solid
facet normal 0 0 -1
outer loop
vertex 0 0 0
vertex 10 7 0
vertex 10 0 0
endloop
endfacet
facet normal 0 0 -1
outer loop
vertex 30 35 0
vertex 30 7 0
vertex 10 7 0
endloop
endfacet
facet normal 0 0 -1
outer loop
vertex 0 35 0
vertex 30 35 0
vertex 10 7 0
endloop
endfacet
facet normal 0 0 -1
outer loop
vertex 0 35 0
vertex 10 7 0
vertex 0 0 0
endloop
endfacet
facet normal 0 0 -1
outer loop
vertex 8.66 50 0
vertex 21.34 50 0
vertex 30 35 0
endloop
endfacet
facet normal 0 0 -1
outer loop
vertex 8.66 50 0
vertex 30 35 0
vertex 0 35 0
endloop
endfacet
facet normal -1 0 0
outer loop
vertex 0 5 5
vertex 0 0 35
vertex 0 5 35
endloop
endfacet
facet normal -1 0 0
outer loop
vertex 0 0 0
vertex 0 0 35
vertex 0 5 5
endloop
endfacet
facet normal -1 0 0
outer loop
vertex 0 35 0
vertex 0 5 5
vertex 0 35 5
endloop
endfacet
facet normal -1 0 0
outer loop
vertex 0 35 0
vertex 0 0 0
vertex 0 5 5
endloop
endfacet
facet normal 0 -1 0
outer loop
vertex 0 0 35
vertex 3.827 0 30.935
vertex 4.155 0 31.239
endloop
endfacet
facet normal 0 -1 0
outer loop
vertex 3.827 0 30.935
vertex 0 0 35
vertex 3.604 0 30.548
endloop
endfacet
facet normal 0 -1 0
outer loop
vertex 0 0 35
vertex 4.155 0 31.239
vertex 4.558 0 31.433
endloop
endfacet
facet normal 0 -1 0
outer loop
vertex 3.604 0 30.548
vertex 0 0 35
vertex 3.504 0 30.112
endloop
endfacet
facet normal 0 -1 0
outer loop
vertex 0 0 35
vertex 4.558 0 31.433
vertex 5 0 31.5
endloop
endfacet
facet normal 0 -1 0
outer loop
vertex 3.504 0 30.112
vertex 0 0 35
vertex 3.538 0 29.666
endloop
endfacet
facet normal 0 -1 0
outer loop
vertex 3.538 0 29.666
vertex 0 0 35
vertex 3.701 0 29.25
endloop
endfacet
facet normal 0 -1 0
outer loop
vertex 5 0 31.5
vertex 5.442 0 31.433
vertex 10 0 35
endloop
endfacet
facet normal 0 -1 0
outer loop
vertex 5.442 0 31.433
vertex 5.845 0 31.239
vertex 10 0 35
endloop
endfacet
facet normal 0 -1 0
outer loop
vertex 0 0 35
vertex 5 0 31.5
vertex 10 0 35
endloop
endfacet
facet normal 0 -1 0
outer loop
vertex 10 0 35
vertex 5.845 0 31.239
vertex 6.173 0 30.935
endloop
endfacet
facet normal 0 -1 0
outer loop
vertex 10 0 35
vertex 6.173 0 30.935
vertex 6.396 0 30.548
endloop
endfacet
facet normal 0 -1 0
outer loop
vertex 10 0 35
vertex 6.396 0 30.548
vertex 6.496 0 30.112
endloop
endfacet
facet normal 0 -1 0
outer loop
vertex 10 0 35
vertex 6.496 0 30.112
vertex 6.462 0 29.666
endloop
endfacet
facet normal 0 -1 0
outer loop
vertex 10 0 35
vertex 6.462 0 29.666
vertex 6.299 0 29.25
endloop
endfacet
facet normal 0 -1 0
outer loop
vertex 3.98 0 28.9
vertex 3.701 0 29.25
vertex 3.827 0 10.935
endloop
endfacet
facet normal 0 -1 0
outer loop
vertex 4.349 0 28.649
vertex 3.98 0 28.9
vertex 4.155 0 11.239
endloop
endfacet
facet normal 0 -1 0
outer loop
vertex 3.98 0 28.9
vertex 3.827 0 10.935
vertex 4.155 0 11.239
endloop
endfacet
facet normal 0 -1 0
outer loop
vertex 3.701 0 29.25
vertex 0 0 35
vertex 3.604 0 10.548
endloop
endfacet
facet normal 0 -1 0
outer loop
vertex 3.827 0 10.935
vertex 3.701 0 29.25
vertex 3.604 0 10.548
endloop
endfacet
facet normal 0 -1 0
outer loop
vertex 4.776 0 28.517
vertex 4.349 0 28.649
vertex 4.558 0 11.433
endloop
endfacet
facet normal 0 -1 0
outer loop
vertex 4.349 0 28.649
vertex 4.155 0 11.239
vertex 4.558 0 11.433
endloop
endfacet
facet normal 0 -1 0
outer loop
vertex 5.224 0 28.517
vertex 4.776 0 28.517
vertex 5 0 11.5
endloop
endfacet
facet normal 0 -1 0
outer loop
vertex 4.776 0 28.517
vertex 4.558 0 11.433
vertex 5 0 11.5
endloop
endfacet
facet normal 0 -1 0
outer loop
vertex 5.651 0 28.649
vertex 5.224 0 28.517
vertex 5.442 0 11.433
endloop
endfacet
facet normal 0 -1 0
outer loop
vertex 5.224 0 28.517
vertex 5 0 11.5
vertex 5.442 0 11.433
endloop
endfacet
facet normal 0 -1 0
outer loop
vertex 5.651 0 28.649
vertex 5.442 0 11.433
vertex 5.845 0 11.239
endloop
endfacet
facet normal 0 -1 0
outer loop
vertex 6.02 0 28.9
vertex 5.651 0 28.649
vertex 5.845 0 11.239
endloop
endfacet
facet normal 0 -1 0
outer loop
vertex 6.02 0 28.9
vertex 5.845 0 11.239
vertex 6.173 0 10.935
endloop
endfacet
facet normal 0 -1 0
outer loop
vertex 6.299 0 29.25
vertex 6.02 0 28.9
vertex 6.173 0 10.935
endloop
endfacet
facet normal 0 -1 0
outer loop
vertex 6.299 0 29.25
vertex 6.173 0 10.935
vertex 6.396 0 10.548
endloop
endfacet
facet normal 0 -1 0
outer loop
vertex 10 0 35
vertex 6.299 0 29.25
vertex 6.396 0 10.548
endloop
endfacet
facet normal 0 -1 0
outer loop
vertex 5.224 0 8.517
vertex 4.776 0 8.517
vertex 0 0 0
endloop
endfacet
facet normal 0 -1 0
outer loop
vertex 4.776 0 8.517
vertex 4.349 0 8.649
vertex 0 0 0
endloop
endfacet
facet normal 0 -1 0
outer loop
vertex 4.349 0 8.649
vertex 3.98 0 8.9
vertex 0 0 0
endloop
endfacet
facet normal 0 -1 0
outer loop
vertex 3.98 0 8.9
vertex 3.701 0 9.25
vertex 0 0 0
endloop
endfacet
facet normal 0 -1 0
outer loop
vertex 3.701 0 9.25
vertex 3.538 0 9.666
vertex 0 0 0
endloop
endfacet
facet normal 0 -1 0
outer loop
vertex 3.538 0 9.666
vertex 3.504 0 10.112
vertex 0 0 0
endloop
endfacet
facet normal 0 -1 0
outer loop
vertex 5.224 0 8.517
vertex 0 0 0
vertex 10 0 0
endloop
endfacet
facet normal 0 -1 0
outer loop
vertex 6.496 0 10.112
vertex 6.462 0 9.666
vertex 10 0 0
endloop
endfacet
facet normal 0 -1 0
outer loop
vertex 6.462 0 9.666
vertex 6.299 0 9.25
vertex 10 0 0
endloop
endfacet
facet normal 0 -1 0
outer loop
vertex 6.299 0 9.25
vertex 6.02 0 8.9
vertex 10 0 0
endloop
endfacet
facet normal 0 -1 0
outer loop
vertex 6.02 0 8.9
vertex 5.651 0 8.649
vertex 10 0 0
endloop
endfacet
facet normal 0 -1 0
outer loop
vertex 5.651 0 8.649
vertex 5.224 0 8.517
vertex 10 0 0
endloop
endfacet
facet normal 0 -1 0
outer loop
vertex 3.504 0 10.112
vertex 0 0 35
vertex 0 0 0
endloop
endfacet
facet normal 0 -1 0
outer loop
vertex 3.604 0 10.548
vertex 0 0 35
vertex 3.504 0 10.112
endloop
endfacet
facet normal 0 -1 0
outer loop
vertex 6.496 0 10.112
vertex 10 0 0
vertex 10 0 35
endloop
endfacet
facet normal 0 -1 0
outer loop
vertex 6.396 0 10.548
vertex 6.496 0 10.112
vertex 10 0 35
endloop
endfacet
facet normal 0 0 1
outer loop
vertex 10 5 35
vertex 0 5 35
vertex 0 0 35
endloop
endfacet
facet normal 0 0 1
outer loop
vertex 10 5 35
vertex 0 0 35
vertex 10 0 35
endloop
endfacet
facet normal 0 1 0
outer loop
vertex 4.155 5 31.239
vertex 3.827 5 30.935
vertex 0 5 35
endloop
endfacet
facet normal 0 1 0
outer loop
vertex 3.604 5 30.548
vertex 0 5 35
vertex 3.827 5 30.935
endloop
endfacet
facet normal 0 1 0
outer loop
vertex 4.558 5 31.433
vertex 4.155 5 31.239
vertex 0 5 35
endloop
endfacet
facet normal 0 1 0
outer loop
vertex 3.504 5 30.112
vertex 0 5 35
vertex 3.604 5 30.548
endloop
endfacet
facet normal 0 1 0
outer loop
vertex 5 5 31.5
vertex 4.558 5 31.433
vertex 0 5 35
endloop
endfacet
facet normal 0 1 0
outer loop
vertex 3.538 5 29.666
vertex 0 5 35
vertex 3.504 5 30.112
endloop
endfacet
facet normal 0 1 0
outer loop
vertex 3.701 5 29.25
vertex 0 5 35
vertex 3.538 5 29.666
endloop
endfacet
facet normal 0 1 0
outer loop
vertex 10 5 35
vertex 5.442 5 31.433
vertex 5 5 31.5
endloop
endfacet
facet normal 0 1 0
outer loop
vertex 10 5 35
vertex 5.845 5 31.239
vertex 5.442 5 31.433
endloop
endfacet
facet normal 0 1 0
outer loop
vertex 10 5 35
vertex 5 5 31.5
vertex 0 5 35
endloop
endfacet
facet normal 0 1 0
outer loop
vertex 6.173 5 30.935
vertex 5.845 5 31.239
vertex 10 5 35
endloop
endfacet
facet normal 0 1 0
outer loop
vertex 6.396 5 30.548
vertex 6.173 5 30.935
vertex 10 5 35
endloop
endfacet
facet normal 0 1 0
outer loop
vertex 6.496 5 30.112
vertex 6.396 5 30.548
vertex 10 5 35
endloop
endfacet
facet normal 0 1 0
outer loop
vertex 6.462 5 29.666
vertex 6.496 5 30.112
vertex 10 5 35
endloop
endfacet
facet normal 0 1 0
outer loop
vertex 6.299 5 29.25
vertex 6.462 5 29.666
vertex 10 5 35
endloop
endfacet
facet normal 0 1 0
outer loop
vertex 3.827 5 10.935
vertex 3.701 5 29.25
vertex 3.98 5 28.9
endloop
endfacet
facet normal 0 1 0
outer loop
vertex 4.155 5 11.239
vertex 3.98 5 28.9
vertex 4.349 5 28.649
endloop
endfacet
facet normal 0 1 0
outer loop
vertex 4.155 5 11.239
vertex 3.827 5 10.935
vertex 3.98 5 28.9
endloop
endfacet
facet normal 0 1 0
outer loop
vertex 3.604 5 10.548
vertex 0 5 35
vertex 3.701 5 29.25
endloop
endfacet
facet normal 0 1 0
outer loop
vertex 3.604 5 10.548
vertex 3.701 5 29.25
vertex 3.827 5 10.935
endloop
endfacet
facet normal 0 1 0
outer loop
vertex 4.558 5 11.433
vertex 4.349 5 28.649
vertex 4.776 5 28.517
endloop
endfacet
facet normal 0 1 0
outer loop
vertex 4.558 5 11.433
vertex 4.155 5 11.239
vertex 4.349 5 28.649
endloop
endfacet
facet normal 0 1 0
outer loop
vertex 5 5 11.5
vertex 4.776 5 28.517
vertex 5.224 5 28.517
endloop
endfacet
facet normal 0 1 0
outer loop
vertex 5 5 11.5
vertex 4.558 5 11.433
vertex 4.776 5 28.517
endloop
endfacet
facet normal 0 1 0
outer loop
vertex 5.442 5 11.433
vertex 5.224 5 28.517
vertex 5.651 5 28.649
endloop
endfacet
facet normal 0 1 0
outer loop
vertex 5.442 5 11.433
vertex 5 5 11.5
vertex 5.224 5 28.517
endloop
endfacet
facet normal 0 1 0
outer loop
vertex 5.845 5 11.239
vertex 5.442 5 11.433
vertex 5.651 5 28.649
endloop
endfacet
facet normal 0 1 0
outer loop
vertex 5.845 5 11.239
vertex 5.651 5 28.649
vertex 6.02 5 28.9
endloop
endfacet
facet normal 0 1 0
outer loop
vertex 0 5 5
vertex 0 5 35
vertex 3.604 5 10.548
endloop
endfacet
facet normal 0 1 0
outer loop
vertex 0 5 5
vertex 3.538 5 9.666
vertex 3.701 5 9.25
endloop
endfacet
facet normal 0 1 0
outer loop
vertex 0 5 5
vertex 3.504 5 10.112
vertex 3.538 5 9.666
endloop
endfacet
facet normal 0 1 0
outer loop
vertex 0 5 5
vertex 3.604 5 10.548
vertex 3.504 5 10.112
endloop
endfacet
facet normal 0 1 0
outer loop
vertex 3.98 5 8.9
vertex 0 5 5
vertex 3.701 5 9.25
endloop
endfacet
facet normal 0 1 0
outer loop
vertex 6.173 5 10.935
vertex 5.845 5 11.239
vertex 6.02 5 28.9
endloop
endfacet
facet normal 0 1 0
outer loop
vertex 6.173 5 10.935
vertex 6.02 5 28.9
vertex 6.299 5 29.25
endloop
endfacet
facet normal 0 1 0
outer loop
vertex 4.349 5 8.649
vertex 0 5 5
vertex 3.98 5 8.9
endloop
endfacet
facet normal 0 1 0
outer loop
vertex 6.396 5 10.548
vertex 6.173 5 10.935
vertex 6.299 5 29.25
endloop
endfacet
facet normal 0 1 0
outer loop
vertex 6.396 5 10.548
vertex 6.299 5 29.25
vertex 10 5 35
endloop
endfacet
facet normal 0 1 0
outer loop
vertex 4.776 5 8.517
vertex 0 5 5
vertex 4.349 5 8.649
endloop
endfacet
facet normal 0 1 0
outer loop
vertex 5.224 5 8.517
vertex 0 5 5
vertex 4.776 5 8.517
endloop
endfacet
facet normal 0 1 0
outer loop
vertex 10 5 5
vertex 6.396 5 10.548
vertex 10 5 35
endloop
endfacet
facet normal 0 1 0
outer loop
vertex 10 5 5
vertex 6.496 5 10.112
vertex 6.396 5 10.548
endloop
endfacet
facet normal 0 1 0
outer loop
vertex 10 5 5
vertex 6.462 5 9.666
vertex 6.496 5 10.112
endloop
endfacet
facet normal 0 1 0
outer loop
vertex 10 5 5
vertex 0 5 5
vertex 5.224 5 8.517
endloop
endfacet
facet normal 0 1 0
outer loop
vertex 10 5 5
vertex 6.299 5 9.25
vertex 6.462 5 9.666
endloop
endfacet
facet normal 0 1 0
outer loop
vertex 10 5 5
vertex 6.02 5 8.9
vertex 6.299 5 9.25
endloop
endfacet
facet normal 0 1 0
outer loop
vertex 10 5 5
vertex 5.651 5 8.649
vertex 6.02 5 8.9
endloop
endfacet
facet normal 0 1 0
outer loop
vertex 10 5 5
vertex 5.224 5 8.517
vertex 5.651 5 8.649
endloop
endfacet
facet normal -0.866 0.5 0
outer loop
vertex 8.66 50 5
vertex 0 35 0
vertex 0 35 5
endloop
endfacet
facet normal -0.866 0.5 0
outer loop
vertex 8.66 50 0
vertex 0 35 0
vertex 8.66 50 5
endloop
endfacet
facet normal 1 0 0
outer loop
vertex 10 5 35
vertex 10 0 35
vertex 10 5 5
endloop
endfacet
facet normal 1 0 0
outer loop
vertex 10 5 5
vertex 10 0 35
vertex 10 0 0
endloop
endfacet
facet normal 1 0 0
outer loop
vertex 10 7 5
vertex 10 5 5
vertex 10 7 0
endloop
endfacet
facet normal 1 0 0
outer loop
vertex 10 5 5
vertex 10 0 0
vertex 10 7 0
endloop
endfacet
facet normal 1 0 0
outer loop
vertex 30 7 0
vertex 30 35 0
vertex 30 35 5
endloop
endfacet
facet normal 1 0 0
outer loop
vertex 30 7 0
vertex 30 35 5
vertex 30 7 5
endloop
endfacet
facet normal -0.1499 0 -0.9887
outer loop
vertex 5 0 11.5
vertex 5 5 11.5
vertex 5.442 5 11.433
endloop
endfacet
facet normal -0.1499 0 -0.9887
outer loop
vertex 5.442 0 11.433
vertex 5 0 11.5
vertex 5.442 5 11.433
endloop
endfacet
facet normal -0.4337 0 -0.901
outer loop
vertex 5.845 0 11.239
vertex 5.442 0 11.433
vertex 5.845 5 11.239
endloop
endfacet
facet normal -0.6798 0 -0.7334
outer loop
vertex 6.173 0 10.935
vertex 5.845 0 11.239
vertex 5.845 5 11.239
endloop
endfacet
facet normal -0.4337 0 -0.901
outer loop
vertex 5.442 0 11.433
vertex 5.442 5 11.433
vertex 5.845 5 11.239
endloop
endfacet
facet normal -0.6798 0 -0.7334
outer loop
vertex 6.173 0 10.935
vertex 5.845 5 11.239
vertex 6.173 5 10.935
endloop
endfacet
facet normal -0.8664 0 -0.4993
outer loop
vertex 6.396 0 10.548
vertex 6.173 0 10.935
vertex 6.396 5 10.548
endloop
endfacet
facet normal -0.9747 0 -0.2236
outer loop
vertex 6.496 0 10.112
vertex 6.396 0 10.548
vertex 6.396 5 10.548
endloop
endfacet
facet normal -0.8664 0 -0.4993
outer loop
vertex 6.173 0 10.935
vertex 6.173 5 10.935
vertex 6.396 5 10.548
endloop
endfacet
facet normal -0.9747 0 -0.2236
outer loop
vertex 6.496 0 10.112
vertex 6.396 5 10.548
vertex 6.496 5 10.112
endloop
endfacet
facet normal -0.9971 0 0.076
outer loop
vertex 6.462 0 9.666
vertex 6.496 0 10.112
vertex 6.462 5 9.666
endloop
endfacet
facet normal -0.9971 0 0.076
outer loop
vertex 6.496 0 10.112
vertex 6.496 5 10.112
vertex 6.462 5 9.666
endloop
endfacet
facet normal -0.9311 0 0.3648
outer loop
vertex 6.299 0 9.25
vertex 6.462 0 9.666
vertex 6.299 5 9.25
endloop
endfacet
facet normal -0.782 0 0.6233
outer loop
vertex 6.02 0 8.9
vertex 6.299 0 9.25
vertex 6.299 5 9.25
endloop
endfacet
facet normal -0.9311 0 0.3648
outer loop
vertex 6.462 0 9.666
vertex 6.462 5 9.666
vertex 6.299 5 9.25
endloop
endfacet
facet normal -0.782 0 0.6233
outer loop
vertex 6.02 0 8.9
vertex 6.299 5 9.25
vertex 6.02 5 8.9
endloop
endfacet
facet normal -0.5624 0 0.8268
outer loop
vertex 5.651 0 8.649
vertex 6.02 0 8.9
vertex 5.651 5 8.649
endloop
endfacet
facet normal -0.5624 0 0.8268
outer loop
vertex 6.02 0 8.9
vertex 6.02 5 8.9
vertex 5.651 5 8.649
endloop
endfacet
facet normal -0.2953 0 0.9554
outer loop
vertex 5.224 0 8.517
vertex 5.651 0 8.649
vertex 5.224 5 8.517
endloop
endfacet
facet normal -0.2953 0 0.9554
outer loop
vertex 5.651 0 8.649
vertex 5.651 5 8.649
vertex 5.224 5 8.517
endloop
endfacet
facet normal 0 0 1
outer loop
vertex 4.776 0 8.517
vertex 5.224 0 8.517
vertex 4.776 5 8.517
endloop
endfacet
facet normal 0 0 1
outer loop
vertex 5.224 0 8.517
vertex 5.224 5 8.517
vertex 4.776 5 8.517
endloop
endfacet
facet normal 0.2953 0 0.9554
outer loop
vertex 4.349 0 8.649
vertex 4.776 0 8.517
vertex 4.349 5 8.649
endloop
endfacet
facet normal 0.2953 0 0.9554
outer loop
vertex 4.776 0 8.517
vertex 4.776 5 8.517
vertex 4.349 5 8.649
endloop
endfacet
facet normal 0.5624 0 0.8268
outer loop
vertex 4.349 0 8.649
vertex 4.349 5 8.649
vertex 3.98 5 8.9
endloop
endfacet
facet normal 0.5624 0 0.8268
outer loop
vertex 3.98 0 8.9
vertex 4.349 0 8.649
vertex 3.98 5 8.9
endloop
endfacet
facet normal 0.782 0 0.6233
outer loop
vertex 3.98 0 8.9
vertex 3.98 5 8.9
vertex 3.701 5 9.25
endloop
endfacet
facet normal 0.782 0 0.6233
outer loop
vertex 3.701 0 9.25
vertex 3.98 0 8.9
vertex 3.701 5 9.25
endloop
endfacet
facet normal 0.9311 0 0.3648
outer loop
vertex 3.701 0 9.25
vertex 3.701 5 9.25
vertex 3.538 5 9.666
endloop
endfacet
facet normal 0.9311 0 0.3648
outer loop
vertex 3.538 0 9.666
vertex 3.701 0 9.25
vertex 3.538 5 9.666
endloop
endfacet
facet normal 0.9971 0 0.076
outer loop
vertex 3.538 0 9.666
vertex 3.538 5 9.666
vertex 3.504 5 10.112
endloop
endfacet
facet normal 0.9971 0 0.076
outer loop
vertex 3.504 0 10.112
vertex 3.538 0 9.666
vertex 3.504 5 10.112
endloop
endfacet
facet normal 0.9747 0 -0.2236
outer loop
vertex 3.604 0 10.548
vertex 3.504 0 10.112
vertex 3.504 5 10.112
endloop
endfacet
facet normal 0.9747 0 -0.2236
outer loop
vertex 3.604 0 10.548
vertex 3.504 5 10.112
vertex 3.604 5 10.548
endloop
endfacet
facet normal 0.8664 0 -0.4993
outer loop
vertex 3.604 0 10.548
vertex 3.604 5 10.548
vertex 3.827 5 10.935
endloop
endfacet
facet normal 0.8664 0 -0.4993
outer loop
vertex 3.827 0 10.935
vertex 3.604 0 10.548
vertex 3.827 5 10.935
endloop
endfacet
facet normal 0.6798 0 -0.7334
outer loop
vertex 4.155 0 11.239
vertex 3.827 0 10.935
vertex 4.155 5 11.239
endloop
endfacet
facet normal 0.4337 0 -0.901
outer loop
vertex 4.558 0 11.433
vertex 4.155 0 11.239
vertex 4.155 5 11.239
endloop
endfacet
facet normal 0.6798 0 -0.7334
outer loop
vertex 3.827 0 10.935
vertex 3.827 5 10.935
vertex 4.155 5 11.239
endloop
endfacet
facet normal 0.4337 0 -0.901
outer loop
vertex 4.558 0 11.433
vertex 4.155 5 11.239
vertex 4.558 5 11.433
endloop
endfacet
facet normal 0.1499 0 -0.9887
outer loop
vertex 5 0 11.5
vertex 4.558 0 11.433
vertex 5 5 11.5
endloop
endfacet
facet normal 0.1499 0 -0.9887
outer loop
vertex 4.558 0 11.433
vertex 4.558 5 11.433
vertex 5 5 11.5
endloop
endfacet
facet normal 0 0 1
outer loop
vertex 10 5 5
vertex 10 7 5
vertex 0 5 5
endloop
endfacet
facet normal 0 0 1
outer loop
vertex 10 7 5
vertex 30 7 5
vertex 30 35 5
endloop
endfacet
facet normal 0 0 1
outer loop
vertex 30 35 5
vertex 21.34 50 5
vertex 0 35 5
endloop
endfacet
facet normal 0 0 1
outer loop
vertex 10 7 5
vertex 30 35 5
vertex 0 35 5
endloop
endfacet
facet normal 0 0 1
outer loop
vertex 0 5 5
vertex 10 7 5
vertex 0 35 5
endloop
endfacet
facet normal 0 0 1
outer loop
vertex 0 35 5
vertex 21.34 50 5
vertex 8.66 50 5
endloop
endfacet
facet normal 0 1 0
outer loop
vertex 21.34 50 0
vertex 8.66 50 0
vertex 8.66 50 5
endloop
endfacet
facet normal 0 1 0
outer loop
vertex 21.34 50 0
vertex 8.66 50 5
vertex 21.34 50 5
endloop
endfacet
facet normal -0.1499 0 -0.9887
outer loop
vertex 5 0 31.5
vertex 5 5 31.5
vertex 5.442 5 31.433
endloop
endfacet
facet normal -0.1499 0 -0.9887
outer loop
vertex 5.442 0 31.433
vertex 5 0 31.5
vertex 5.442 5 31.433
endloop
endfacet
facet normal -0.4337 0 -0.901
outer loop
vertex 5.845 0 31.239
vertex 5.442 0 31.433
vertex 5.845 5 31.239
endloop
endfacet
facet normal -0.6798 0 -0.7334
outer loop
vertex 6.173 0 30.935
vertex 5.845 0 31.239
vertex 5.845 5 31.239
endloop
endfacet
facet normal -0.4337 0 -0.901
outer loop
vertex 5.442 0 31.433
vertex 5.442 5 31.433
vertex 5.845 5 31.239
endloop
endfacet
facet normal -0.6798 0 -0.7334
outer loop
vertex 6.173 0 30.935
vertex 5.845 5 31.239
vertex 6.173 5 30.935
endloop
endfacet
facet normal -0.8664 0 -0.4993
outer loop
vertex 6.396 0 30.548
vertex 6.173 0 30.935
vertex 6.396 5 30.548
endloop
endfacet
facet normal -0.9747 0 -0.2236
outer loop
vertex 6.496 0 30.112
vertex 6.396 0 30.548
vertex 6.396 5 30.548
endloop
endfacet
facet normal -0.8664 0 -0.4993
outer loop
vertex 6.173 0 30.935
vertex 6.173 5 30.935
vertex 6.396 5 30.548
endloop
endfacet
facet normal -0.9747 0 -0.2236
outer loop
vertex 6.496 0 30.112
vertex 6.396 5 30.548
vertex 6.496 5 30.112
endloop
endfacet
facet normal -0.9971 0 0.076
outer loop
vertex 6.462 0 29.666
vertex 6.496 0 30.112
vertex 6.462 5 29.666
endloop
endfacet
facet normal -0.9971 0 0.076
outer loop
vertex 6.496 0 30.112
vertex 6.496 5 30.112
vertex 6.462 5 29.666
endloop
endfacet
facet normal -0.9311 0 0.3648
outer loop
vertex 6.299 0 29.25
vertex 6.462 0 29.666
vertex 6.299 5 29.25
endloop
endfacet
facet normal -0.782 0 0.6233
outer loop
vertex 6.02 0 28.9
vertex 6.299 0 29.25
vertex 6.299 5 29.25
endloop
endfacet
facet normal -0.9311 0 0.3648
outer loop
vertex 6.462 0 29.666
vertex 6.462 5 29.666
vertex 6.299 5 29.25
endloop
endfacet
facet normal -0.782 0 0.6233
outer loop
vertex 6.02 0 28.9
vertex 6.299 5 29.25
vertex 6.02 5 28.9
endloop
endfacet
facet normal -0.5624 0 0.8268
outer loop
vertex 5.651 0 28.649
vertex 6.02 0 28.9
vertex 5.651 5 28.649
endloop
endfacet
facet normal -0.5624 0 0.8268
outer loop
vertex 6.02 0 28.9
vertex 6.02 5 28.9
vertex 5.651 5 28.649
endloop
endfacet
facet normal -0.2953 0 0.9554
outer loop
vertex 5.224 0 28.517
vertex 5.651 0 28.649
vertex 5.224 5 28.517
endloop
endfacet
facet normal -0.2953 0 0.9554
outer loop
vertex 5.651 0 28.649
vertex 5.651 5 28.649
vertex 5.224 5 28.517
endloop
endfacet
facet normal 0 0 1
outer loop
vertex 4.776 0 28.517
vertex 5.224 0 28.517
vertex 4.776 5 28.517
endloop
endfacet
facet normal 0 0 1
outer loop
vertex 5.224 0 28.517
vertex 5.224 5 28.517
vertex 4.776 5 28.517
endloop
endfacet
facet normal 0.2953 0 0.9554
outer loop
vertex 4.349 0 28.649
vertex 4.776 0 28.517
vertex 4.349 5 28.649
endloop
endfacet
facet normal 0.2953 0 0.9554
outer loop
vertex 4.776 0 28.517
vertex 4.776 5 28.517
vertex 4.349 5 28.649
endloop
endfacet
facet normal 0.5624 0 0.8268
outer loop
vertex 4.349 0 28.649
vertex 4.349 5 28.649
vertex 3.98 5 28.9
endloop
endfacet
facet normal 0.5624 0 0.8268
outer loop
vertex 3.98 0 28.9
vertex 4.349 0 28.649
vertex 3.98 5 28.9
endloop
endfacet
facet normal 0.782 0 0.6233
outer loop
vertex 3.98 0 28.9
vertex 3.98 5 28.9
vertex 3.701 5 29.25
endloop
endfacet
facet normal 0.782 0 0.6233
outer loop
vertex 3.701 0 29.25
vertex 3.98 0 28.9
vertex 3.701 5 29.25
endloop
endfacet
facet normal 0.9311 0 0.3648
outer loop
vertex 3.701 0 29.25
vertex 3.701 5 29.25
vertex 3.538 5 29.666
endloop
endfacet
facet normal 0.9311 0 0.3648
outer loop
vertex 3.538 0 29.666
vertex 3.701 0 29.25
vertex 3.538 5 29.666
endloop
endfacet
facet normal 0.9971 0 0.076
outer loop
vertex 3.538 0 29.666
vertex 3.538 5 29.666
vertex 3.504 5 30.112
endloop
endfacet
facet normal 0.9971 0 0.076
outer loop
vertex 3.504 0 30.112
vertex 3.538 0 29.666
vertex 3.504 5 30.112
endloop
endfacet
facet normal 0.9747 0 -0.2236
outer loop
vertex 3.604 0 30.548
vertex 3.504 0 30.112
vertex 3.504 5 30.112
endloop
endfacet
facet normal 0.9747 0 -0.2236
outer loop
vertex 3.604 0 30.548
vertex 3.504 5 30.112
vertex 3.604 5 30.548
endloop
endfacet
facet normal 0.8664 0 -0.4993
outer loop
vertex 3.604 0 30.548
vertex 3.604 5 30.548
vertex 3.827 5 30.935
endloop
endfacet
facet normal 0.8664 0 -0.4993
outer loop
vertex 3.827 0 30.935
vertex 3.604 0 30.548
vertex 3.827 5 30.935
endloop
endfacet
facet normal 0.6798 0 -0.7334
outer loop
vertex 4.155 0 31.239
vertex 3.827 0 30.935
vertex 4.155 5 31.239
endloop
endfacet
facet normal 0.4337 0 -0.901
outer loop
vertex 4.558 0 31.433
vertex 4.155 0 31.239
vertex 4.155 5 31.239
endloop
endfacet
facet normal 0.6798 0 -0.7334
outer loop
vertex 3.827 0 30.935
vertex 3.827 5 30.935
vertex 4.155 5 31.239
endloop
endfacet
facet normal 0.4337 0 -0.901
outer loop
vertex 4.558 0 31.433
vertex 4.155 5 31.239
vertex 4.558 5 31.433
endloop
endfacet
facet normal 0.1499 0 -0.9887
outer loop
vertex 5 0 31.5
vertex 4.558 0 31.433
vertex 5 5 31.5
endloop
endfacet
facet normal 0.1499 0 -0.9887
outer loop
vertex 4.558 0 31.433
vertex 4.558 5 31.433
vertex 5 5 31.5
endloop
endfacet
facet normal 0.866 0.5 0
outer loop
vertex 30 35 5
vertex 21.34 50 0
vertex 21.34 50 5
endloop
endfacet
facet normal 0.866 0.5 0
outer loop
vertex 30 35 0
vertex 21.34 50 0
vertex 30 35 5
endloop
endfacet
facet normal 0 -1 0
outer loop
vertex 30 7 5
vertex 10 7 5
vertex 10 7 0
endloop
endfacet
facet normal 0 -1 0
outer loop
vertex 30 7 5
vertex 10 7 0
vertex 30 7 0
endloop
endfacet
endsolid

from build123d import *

# Parameters (mm, degrees)
BOSS_EXTRUDE1_DEPTH = 5
SKETCH2_W           = 10
SKETCH2_H           = 5
BOSS_EXTRUDE2_DEPTH = 30
SKETCH3_R           = 1.5
CUT_EXTRUDE1_DEPTH  = 5
SKETCH4_W           = 20
SKETCH4_H           = 7
CUT_EXTRUDE2_DEPTH  = 5


with BuildPart() as part:
    # Sketch1 → Boss-Extrude1 (new body)
    with BuildSketch(Plane.XY):
        Polygon((0, 35), (8.660254038, 50), (21.339745962, 50), (30, 35), (30, 0), (0, 0), align=None)
    extrude(amount=BOSS_EXTRUDE1_DEPTH)

    # Sketch2 → Boss-Extrude2 (add)
    with BuildSketch(Plane.XY.offset(5)):
        with Locations((5, 2.5)):
            Rectangle(SKETCH2_W, SKETCH2_H)
    extrude(amount=BOSS_EXTRUDE2_DEPTH)

    # Sketch3 → Cut-Extrude1 (cut)
    with BuildSketch(Plane(origin=(0, 5, 0), x_dir=(1, 0, 0), z_dir=(0, 1, 0))):
        with Locations(Location((5, -10, 0), (0, 0, 270))):
            Circle(SKETCH3_R)
        with Locations(Location((5, -30, 0), (0, 0, 270))):
            Circle(SKETCH3_R)
    extrude(amount=-CUT_EXTRUDE1_DEPTH, mode=Mode.SUBTRACT)

    # Sketch4 → Cut-Extrude2 (cut)
    with BuildSketch(Plane.XY.offset(5)):
        with Locations((20, 3.5)):
            Rectangle(SKETCH4_W, SKETCH4_H)
    extrude(amount=-CUT_EXTRUDE2_DEPTH, mode=Mode.SUBTRACT)


solid = part.part
